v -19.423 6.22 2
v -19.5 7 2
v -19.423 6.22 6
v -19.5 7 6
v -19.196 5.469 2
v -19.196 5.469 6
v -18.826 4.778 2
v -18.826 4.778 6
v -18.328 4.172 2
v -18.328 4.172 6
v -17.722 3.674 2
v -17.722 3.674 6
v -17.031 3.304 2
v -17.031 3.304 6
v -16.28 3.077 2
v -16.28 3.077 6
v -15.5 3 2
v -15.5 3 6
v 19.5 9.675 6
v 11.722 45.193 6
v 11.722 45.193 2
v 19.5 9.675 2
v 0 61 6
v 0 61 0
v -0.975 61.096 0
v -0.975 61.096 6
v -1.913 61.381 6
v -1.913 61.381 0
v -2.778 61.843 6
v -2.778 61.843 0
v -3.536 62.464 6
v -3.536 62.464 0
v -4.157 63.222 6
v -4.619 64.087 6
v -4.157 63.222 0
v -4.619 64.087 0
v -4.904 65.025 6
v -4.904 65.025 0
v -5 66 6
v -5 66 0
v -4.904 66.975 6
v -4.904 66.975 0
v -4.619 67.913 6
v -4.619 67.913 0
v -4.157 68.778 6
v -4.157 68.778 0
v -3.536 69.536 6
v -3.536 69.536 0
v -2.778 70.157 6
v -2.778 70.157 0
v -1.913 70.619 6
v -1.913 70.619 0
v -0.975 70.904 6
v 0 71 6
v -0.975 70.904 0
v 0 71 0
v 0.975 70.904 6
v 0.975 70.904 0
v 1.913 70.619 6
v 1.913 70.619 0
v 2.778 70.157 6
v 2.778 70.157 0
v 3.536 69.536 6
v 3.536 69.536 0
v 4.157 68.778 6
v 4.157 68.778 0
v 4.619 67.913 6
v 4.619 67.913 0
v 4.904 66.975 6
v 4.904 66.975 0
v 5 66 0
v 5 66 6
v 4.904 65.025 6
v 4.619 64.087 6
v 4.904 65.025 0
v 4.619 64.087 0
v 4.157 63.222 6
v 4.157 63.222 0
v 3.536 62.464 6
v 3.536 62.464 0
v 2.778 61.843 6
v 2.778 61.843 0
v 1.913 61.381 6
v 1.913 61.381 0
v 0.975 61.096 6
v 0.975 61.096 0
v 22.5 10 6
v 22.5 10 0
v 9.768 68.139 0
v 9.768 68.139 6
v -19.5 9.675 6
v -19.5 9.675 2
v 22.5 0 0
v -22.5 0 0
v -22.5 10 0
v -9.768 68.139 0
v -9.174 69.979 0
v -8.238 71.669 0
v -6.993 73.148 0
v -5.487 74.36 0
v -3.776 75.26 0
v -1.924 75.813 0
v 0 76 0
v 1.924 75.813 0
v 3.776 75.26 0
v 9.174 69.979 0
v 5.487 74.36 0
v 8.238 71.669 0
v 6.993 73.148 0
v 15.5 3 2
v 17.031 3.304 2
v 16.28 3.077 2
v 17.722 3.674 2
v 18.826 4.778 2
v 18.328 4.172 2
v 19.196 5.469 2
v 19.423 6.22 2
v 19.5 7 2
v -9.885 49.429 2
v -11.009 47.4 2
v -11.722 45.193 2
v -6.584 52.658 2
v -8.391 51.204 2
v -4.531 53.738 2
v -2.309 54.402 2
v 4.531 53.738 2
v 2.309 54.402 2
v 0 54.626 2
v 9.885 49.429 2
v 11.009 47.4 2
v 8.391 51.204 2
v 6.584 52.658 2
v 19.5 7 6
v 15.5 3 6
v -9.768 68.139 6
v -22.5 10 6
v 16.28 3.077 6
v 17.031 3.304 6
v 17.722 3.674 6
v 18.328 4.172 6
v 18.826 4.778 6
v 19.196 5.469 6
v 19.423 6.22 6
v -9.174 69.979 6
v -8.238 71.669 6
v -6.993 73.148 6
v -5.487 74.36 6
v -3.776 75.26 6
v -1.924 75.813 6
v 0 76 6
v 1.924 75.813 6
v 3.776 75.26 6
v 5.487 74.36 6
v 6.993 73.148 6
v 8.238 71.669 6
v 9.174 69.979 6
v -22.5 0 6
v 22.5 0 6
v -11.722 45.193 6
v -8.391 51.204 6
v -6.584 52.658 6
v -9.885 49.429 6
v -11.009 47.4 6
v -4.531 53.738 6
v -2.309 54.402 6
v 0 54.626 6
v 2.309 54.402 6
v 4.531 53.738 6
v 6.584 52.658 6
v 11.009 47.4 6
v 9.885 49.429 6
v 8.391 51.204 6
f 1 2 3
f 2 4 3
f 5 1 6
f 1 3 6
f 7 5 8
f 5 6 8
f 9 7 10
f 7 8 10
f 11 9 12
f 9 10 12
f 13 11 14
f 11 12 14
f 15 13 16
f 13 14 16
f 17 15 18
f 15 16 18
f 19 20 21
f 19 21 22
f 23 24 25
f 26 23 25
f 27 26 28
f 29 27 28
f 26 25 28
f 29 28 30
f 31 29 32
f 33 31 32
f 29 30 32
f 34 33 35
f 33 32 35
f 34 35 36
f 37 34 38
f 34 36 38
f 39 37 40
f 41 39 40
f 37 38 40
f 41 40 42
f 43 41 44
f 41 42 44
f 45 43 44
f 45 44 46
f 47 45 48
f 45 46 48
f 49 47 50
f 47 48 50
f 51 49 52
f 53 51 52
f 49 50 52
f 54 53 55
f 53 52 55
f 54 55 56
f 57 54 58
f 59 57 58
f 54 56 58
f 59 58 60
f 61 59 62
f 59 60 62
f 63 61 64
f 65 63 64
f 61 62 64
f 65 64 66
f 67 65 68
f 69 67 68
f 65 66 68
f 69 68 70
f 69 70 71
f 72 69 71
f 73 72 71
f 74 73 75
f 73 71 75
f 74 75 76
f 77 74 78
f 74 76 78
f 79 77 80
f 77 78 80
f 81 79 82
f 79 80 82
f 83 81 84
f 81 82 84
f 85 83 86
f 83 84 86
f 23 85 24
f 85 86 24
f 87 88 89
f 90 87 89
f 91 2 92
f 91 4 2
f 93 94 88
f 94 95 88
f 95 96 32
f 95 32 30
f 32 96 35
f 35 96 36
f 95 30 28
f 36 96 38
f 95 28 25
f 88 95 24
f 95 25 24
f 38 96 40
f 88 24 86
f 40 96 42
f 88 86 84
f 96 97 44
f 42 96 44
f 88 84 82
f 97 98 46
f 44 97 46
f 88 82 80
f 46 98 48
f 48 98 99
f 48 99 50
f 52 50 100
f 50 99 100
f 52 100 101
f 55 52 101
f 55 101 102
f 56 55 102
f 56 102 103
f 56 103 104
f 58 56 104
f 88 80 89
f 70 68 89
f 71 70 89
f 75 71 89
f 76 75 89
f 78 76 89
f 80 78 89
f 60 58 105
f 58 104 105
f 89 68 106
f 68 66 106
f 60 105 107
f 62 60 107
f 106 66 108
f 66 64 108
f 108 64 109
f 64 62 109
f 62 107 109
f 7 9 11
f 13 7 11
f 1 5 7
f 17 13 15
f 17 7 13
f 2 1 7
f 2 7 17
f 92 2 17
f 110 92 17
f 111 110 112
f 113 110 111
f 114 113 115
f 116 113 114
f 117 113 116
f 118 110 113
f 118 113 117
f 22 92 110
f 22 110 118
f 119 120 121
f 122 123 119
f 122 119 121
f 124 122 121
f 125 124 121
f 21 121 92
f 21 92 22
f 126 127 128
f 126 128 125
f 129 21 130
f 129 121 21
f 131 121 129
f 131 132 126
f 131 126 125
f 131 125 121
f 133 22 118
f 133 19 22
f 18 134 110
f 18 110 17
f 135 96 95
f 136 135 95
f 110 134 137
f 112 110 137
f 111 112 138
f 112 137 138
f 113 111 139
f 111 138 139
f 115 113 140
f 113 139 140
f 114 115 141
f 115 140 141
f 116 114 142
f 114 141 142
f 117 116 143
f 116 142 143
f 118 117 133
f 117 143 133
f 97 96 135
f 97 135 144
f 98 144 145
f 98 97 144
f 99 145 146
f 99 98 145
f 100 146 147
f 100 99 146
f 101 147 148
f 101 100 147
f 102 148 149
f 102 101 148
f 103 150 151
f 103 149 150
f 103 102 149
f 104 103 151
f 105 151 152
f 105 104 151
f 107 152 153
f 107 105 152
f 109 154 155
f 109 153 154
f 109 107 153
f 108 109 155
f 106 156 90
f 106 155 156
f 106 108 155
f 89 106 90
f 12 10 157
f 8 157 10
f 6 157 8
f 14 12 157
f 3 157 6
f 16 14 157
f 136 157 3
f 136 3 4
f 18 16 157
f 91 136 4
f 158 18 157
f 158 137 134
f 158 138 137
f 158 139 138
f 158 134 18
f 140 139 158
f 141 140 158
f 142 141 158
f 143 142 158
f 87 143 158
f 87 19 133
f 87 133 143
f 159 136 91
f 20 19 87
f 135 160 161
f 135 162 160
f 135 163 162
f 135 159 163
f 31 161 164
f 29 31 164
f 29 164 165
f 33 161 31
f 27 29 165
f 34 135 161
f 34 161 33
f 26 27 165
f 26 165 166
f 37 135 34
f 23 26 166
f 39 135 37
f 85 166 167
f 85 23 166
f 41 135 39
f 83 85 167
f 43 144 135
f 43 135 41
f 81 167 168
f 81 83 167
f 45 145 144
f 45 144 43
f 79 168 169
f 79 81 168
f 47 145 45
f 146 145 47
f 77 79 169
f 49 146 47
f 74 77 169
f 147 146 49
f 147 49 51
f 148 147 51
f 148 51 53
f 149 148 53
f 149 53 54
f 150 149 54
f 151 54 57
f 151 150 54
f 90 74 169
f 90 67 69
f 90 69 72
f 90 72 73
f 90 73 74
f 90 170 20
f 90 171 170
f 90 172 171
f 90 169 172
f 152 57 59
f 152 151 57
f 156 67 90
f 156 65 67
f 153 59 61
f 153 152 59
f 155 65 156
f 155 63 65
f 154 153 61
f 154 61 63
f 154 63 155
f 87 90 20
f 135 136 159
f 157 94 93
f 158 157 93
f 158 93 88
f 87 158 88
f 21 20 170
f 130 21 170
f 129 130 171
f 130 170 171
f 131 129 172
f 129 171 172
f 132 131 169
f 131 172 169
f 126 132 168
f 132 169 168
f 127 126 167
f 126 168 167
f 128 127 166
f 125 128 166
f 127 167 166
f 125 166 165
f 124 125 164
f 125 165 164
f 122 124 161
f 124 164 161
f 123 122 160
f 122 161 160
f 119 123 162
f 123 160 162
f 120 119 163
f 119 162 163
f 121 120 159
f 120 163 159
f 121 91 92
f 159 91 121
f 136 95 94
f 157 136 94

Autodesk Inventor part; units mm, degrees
ref_plane "YZ Plane" through (0, 0, 0) normal (1, 0, 0) x (0, 1, 0)
ref_plane "XZ Plane" through (0, 0, 0) normal (0, 1, 0) x (-1, 0, 0)
ref_plane "XY Plane" through (0, 0, 0) normal (0, 0, 1) x (1, 0, 0)
sketch "Sketch1" plane through (0, 0, 0) normal (0, 0, 1) x (1, 0, 0)
  line L0 (-22.5, 0) -> (22.5, 0)
  line L1 (22.5, 0) -> (22.5, 10)
  line L2 (22.5, 10) -> (9.7685, 68.1391)
  arc A0 (9.7685, 68.1391) -> (-9.7685, 68.1391) centre (0, 66) ccw
  line L3 (-9.7685, 68.1391) -> (-22.5, 10)
  line L4 (-22.5, 10) -> (-22.5, 0)
  point P0 (0, 0)
  point P1 (0, 0)
  dimension "d0" = 45
  dimension "d1" = 10
  dimension "d2" = 10
  dimension "d3" = 66
extrude "Extrusion1" add sketch "Sketch1" along normal blind 6
sketch "Sketch2" plane through (0, 0, 6) normal (0, 0, 1) x (1, 0, 0)
  line L0 (22.5, 0) -> (22.5, 10) projected
  line L1 (22.5, 10) -> (9.7685, 68.1391) projected
  line L2 (-9.7685, 68.1391) -> (-22.5, 10) projected
  line L3 (-22.5, 10) -> (-22.5, 0) projected
  line L4 (-22.5, 0) -> (22.5, 0) projected
  line L5 (-19.5, 9.6754) -> (-11.7222, 45.1931)
  line L6 (11.7222, 45.1931) -> (19.5, 9.6754)
  line L7 (19.5, 9.6754) -> (19.5, 7)
  line L8 (15.5, 3) -> (-15.5, 3)
  line L9 (-19.5, 7) -> (-19.5, 9.6754)
  arc A0 (11.7222, 45.1931) -> (-11.7222, 45.1931) centre (0, 42.6261) ccw
  arc A1 (-19.5, 7) -> (-15.5, 3) centre (-15.5, 7) ccw
  arc A2 (15.5, 3) -> (19.5, 7) centre (15.5, 7) ccw
  point P0 (0, 0)
  dimension "d6" = 3
  dimension "d7" = 12
  dimension "d8" = 3
  dimension "d9" = 4
extrude "Extrusion2" cut sketch "Sketch2" against normal blind 4
sketch "Sketch3" plane through (0, 0, 6) normal (0, 0, 1) x (1, 0, 0)
  arc A0 (9.7685, 68.1391) -> (-9.7685, 68.1391) centre (0, 66) ccw projected
  point P0 (0, 0)
hole "Hole1" at (0, 66, 6) direction (0, 0, -1) diameter 10 end through all
properties part number "Bearing High" material "Steel"
